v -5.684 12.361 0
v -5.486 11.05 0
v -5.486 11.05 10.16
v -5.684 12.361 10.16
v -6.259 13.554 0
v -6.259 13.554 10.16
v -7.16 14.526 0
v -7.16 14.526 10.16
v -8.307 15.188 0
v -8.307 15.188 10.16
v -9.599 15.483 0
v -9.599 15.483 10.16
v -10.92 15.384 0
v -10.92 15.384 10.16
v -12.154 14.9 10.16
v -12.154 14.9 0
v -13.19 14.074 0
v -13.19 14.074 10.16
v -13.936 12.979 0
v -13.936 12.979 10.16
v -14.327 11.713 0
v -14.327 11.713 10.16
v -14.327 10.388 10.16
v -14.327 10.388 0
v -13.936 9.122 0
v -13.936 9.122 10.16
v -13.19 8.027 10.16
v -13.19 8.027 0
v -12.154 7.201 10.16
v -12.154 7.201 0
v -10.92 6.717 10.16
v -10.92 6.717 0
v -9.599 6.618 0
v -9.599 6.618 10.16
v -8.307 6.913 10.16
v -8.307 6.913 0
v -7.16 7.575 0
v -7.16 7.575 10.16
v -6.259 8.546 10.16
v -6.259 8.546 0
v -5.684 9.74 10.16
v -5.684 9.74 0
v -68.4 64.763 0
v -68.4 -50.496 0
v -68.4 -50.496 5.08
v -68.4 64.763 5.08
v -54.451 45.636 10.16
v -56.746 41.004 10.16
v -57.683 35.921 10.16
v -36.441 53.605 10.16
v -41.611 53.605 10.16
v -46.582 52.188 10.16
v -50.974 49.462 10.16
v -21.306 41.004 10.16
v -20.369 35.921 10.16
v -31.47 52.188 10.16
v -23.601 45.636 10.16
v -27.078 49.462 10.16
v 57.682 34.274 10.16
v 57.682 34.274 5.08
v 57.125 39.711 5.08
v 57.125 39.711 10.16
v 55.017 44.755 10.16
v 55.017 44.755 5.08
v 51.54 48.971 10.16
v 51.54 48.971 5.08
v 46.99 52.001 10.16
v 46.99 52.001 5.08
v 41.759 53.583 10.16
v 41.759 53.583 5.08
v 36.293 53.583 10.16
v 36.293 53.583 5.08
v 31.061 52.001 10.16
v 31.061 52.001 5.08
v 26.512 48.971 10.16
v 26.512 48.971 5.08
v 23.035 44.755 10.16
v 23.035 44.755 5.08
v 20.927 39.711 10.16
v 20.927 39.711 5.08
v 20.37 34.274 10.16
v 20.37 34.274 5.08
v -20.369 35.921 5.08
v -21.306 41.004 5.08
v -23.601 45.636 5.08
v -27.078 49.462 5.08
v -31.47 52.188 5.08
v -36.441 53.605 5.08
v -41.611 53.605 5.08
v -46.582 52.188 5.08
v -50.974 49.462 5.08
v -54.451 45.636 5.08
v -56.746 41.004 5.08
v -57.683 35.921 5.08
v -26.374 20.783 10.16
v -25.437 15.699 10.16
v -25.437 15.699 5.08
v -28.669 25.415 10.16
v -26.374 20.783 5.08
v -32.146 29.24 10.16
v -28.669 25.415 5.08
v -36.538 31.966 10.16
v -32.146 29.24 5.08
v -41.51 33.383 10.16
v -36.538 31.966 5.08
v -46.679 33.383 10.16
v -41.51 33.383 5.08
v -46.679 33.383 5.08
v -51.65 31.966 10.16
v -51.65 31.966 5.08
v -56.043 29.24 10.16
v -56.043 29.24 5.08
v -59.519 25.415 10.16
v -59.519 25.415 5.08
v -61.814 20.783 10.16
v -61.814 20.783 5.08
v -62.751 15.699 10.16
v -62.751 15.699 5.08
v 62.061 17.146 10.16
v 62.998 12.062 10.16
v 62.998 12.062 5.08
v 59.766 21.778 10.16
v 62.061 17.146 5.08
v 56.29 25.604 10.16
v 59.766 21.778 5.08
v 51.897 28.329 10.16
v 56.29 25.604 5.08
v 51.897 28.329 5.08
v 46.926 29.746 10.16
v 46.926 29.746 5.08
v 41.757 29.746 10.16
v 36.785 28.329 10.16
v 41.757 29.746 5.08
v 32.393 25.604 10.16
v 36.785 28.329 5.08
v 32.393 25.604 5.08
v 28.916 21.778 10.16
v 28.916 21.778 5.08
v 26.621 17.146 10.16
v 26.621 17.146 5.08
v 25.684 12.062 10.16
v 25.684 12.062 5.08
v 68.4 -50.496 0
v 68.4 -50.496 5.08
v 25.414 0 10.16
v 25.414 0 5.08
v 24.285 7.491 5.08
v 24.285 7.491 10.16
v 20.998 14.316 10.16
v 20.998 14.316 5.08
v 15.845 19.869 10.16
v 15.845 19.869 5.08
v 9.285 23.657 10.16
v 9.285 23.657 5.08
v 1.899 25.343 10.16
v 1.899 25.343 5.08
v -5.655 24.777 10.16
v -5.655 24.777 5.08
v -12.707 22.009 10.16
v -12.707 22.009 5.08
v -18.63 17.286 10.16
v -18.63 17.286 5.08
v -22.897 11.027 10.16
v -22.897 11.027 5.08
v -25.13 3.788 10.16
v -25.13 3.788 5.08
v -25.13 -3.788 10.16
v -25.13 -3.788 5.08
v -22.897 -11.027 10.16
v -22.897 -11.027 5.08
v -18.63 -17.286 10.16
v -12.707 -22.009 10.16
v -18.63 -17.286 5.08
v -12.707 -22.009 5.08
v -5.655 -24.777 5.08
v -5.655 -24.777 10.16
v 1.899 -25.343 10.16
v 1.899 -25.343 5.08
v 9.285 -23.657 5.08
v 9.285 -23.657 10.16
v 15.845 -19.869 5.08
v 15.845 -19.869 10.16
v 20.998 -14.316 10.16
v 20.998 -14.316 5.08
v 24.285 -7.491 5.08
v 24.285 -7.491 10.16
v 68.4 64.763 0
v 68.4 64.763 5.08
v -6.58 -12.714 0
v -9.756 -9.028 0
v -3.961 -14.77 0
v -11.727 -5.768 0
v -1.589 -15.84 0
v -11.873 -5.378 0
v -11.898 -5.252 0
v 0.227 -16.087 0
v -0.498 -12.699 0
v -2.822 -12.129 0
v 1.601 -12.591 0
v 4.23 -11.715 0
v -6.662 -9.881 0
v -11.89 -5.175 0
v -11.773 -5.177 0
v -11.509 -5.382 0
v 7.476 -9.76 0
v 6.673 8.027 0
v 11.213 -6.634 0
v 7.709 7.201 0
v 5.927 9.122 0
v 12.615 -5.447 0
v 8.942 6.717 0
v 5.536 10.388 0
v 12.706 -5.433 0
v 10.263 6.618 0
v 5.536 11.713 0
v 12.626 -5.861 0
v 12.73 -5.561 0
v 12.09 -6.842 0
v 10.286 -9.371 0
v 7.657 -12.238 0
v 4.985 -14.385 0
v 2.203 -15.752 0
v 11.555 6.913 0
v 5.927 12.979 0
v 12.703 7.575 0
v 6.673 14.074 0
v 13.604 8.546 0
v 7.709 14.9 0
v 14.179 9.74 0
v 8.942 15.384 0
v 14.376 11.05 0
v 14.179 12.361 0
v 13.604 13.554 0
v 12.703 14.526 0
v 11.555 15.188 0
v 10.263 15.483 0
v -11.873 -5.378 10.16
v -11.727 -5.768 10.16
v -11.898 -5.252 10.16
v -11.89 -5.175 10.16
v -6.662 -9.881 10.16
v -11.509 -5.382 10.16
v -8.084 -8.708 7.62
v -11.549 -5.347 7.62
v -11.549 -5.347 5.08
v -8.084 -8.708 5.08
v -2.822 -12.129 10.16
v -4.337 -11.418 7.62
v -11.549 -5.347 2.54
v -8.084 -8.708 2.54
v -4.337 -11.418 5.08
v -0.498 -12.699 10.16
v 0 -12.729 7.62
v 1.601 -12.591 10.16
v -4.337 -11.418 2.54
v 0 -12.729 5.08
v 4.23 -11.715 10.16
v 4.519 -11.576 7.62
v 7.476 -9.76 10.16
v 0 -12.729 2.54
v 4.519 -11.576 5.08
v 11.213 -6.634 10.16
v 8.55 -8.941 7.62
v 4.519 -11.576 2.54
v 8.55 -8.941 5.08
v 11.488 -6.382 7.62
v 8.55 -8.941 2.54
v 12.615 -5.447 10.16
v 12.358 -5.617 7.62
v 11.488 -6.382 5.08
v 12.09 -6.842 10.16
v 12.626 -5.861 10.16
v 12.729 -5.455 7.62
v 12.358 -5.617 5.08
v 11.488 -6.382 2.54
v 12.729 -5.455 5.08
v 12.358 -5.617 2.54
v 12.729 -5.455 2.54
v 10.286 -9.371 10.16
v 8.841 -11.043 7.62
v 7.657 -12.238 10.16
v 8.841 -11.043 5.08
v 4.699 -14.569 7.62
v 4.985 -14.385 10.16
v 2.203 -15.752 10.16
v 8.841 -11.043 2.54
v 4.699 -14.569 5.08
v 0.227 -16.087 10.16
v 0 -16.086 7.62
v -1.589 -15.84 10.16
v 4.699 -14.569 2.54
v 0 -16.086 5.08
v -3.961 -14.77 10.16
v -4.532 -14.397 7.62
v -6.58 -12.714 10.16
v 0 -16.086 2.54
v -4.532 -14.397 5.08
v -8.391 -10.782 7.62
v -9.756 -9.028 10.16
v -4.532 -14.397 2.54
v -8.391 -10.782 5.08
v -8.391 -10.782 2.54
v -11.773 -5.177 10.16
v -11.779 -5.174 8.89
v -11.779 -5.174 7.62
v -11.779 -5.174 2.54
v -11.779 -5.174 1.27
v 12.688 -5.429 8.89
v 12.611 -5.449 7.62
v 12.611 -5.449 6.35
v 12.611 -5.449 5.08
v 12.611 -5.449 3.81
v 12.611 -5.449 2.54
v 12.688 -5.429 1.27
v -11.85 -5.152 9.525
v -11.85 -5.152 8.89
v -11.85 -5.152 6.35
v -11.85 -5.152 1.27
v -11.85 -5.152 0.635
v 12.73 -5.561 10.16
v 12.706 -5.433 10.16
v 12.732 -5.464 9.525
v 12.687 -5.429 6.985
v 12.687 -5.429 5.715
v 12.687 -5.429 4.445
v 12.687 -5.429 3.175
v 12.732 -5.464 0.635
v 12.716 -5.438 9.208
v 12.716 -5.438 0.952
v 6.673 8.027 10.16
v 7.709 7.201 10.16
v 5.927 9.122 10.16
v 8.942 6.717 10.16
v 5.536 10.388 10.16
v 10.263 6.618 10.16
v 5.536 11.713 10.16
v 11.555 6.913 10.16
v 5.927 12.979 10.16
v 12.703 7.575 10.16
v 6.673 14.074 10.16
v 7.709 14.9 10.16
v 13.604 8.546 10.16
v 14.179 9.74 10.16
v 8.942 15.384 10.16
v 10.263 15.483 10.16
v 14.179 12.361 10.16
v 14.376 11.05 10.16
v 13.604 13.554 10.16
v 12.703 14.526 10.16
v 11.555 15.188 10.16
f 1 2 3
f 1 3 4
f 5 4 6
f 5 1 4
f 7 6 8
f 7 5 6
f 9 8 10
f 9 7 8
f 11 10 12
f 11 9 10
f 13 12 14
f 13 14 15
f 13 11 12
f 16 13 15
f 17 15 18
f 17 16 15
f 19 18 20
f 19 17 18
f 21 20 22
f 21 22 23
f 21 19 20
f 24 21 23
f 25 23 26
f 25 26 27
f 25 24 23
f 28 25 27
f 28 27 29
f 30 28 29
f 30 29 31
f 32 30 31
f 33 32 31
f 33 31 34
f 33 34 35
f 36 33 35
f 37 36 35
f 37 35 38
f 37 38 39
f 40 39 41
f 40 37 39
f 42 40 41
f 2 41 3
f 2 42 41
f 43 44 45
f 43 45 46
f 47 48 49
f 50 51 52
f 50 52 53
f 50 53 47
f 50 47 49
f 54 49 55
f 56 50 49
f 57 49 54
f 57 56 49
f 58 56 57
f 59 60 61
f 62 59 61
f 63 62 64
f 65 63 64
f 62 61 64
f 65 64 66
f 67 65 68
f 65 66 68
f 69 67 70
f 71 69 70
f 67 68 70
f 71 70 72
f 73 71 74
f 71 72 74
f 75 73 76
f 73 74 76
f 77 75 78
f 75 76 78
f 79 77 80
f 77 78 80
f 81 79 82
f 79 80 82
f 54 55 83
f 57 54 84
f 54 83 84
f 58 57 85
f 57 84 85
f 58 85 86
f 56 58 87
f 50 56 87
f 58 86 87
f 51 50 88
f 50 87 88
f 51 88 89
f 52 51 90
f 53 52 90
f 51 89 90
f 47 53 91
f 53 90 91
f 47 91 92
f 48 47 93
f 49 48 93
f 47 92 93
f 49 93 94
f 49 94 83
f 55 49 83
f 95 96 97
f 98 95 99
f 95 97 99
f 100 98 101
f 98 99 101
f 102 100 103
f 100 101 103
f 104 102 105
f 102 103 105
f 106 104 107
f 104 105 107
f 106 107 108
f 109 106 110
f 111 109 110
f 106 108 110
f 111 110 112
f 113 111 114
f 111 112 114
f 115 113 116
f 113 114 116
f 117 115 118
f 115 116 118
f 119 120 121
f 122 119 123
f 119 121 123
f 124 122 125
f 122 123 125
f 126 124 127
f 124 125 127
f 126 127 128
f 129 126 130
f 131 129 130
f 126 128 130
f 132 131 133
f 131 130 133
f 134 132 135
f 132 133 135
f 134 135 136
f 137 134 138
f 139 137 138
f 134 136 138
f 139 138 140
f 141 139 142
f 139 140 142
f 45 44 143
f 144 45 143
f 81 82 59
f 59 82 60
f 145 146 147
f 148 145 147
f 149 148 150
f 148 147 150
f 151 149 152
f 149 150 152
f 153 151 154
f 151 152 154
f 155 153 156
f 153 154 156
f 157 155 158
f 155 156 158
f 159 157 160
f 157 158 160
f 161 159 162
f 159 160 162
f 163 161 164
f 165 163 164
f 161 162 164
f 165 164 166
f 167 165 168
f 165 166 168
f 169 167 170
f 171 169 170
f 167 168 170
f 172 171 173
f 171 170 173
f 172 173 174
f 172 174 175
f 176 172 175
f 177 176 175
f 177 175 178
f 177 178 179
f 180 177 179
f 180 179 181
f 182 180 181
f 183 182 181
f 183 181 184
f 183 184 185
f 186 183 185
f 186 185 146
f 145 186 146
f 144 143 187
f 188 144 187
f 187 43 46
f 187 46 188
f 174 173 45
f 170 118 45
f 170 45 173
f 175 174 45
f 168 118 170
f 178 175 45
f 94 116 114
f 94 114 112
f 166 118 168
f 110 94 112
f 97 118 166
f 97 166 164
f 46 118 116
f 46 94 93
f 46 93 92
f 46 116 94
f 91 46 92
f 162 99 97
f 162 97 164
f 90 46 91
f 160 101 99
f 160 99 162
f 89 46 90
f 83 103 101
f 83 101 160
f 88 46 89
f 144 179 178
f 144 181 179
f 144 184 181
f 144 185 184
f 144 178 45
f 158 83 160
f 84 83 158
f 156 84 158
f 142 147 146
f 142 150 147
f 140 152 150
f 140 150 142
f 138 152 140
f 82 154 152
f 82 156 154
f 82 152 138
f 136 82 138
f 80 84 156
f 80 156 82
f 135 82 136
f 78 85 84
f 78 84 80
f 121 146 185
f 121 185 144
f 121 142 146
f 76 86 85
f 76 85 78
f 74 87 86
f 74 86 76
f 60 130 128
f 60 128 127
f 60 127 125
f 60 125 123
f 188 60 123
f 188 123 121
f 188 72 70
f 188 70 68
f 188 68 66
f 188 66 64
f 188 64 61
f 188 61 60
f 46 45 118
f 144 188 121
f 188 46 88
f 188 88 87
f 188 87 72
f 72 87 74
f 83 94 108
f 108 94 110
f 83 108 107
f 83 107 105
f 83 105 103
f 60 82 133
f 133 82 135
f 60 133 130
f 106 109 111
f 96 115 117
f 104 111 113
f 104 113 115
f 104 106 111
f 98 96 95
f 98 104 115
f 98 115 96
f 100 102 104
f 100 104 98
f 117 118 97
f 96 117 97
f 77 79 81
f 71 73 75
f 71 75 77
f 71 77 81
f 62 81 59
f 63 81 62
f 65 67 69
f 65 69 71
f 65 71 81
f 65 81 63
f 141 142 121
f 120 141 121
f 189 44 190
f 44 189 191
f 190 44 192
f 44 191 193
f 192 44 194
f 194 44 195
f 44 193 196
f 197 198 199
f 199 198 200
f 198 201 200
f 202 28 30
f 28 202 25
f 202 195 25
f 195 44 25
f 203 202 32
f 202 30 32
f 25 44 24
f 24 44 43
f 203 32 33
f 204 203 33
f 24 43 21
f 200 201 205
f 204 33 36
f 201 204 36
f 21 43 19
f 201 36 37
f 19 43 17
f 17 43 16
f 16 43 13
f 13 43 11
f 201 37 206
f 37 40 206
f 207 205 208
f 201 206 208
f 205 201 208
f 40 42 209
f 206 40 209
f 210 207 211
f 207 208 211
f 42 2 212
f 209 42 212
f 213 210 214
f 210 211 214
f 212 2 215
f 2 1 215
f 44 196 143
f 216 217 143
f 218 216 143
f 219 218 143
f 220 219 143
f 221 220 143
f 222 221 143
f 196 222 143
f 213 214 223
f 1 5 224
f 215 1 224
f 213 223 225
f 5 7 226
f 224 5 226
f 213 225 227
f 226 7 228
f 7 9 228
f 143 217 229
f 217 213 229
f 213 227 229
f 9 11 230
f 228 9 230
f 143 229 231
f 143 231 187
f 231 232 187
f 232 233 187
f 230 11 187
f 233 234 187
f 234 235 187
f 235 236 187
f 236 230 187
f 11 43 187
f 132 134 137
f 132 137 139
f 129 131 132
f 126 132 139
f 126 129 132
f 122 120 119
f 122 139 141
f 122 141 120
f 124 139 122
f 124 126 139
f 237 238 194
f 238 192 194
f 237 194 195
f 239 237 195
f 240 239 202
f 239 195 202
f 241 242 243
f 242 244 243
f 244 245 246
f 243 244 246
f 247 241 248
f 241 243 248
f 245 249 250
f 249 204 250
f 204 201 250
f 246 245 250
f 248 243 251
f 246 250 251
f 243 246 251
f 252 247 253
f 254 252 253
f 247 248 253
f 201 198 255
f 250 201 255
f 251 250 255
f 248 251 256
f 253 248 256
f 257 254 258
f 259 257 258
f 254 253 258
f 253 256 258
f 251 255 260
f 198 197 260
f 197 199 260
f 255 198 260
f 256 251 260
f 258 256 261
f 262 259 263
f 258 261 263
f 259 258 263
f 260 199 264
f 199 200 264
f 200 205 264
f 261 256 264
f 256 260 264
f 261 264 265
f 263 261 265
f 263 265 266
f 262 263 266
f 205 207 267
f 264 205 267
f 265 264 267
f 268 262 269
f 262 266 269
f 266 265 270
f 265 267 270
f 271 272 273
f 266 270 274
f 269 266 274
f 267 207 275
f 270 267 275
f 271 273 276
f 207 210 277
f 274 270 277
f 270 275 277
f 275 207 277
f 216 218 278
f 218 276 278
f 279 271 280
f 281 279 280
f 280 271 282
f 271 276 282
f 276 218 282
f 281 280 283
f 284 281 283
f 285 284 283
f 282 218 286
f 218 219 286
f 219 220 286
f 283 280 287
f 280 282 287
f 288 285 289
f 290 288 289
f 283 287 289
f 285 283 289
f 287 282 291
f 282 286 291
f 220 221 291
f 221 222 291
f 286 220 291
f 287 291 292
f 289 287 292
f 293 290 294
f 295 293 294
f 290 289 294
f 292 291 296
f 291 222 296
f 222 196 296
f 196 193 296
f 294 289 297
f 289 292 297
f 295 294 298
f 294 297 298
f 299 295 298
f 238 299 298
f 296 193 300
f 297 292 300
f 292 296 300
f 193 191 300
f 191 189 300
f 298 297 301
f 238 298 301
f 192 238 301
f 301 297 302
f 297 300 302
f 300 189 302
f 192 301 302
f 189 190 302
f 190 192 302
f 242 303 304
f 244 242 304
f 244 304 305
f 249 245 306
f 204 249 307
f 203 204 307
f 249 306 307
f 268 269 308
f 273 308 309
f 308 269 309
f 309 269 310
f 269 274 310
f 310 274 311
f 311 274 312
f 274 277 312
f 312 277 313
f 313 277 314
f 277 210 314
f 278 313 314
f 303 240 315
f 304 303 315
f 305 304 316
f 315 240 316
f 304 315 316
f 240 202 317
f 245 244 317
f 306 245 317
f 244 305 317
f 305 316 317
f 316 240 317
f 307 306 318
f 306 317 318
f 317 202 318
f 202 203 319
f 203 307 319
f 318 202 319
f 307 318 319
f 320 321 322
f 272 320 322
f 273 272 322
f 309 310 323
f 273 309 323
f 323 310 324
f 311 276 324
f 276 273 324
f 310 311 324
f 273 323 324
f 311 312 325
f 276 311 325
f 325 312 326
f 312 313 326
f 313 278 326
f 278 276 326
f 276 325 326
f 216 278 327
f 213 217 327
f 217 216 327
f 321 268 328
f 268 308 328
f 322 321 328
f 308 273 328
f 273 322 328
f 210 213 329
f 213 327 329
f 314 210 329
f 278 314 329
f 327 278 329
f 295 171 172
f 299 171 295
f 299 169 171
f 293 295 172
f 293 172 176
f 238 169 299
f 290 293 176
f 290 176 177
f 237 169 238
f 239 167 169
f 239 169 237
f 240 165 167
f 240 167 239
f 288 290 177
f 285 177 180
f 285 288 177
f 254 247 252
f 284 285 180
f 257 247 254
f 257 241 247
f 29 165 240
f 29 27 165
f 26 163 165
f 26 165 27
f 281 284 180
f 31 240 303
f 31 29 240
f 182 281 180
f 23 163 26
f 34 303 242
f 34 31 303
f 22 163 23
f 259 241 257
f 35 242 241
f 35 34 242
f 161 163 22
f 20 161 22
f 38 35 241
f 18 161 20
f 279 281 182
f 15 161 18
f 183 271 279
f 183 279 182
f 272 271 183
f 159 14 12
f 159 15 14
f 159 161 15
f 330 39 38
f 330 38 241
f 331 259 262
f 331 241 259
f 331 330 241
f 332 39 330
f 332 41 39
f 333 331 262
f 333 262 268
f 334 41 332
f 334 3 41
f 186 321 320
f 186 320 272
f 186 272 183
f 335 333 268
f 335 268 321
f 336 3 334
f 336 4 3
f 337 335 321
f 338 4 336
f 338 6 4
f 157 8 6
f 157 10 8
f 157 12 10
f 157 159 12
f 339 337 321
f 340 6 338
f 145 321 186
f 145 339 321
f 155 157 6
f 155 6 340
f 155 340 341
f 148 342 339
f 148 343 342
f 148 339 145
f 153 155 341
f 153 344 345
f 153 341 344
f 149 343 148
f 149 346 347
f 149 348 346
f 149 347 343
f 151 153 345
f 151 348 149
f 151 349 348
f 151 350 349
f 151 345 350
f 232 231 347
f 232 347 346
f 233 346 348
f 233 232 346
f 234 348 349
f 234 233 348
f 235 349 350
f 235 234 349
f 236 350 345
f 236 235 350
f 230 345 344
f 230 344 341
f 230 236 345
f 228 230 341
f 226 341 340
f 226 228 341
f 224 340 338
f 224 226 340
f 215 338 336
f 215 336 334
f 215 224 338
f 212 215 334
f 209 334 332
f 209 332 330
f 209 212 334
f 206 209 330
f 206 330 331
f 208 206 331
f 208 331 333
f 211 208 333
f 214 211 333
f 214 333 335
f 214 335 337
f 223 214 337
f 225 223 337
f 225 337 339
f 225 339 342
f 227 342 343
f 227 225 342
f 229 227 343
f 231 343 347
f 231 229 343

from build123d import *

# Parameters (mm, degrees)
F0_W     = 136.8003189564
F0_H     = 115.2591593564
F0_R     = 25.413882958
F1_DEPTH = 5.08
F2_DEPTH = 10.16
F0_R_2   = 4.445
F3_DEPTH = 10.16


# Not quite as in the source:
# - the program builds the solid bodies; features that only make, move or delete a surface that nothing else refers to are left out


with BuildPart() as f1:
    # F0 (on Top) → F1 (new body)
    with BuildSketch(Plane.XY):
        with Locations((0, 7.1337576956)):
            Rectangle(F0_W, F0_H)
        Circle(F0_R, mode=Mode.SUBTRACT)
        with BuildLine():
            Line((-25.4373313075, 15.699069947), (-62.7512871141, 15.699069947))
            ThreePointArc((-62.7512871141, 15.699069947), (-44.0943092108, 33.5629857305), (-25.4373313075, 15.699069947))
        make_face(mode=Mode.SUBTRACT)
        with BuildLine():
            Line((-20.3688811746, 35.9205551982), (-57.6828369811, 35.9205551982))
            ThreePointArc((-57.6828369811, 35.9205551982), (-39.0258590779, 53.7844709817), (-20.3688811746, 35.9205551982))
        make_face(mode=Mode.SUBTRACT)
        with BuildLine():
            Line((62.9981844539, 12.06225143), (25.6842286473, 12.06225143))
            ThreePointArc((25.6842286473, 12.06225143), (44.3412065506, 29.9261672135), (62.9981844539, 12.06225143))
        make_face(mode=Mode.SUBTRACT)
        with BuildLine():
            ThreePointArc((20.3699840242, 34.2742279379), (39.0258590779, 53.7844709817), (57.6817341315, 34.2742279379))
            Line((57.6817341315, 34.2742279379), (20.3699840242, 34.2742279379))
        make_face(mode=Mode.SUBTRACT)
    extrude(amount=F1_DEPTH)

    # F0 (on Top) → F2 (join)
    with BuildSketch(Plane.XY):
        with BuildLine():
            ThreePointArc((-20.3688811746, 35.9205551982), (-39.0258590779, 53.7844709817), (-57.6828369811, 35.9205551982))
            Line((-57.6828369811, 35.9205551982), (-20.3688811746, 35.9205551982))
        make_face()
        with BuildLine():
            ThreePointArc((-25.4373313075, 15.699069947), (-44.0943092108, 33.5629857305), (-62.7512871141, 15.699069947))
            Line((-62.7512871141, 15.699069947), (-25.4373313075, 15.699069947))
        make_face()
        with BuildLine():
            Line((20.3699840242, 34.2742279379), (57.6817341315, 34.2742279379))
            ThreePointArc((57.6817341315, 34.2742279379), (39.0258590779, 53.7844709817), (20.3699840242, 34.2742279379))
        make_face()
        with BuildLine():
            ThreePointArc((62.9981844539, 12.06225143), (44.3412065506, 29.9261672135), (25.6842286473, 12.06225143))
            Line((25.6842286473, 12.06225143), (62.9981844539, 12.06225143))
        make_face()
    extrude(amount=F2_DEPTH)

    # F0 (on Top) → F3 (join)
    with BuildSketch(Plane.XY):
        Circle(F0_R)
        with BuildLine():
            add(Edge.make_bspline(
                [(-11.889597401, -5.1754722372), (-11.6308932935, -4.6629733601), (-0.1804625636, -20.6748608417), (19.2699362073, 3.5560661133), (-0.2450377996, -26.2958289114), (-12.1664951894, -5.7240132208), (-11.889597401, -5.1754722372)],
                knots=[0, 0, 0, 0, 0.2394881843, 0.4838109378, 0.743669518, 1, 1, 1, 1], degree=3))
        make_face(mode=Mode.SUBTRACT)
        with Locations((-9.9313119426, 11.0503323376)):
            Circle(F0_R_2, mode=Mode.SUBTRACT)
        with Locations((9.9313119426, 11.0503323376)):
            Circle(F0_R_2, mode=Mode.SUBTRACT)
    extrude(amount=F3_DEPTH)


solid = f1.part
